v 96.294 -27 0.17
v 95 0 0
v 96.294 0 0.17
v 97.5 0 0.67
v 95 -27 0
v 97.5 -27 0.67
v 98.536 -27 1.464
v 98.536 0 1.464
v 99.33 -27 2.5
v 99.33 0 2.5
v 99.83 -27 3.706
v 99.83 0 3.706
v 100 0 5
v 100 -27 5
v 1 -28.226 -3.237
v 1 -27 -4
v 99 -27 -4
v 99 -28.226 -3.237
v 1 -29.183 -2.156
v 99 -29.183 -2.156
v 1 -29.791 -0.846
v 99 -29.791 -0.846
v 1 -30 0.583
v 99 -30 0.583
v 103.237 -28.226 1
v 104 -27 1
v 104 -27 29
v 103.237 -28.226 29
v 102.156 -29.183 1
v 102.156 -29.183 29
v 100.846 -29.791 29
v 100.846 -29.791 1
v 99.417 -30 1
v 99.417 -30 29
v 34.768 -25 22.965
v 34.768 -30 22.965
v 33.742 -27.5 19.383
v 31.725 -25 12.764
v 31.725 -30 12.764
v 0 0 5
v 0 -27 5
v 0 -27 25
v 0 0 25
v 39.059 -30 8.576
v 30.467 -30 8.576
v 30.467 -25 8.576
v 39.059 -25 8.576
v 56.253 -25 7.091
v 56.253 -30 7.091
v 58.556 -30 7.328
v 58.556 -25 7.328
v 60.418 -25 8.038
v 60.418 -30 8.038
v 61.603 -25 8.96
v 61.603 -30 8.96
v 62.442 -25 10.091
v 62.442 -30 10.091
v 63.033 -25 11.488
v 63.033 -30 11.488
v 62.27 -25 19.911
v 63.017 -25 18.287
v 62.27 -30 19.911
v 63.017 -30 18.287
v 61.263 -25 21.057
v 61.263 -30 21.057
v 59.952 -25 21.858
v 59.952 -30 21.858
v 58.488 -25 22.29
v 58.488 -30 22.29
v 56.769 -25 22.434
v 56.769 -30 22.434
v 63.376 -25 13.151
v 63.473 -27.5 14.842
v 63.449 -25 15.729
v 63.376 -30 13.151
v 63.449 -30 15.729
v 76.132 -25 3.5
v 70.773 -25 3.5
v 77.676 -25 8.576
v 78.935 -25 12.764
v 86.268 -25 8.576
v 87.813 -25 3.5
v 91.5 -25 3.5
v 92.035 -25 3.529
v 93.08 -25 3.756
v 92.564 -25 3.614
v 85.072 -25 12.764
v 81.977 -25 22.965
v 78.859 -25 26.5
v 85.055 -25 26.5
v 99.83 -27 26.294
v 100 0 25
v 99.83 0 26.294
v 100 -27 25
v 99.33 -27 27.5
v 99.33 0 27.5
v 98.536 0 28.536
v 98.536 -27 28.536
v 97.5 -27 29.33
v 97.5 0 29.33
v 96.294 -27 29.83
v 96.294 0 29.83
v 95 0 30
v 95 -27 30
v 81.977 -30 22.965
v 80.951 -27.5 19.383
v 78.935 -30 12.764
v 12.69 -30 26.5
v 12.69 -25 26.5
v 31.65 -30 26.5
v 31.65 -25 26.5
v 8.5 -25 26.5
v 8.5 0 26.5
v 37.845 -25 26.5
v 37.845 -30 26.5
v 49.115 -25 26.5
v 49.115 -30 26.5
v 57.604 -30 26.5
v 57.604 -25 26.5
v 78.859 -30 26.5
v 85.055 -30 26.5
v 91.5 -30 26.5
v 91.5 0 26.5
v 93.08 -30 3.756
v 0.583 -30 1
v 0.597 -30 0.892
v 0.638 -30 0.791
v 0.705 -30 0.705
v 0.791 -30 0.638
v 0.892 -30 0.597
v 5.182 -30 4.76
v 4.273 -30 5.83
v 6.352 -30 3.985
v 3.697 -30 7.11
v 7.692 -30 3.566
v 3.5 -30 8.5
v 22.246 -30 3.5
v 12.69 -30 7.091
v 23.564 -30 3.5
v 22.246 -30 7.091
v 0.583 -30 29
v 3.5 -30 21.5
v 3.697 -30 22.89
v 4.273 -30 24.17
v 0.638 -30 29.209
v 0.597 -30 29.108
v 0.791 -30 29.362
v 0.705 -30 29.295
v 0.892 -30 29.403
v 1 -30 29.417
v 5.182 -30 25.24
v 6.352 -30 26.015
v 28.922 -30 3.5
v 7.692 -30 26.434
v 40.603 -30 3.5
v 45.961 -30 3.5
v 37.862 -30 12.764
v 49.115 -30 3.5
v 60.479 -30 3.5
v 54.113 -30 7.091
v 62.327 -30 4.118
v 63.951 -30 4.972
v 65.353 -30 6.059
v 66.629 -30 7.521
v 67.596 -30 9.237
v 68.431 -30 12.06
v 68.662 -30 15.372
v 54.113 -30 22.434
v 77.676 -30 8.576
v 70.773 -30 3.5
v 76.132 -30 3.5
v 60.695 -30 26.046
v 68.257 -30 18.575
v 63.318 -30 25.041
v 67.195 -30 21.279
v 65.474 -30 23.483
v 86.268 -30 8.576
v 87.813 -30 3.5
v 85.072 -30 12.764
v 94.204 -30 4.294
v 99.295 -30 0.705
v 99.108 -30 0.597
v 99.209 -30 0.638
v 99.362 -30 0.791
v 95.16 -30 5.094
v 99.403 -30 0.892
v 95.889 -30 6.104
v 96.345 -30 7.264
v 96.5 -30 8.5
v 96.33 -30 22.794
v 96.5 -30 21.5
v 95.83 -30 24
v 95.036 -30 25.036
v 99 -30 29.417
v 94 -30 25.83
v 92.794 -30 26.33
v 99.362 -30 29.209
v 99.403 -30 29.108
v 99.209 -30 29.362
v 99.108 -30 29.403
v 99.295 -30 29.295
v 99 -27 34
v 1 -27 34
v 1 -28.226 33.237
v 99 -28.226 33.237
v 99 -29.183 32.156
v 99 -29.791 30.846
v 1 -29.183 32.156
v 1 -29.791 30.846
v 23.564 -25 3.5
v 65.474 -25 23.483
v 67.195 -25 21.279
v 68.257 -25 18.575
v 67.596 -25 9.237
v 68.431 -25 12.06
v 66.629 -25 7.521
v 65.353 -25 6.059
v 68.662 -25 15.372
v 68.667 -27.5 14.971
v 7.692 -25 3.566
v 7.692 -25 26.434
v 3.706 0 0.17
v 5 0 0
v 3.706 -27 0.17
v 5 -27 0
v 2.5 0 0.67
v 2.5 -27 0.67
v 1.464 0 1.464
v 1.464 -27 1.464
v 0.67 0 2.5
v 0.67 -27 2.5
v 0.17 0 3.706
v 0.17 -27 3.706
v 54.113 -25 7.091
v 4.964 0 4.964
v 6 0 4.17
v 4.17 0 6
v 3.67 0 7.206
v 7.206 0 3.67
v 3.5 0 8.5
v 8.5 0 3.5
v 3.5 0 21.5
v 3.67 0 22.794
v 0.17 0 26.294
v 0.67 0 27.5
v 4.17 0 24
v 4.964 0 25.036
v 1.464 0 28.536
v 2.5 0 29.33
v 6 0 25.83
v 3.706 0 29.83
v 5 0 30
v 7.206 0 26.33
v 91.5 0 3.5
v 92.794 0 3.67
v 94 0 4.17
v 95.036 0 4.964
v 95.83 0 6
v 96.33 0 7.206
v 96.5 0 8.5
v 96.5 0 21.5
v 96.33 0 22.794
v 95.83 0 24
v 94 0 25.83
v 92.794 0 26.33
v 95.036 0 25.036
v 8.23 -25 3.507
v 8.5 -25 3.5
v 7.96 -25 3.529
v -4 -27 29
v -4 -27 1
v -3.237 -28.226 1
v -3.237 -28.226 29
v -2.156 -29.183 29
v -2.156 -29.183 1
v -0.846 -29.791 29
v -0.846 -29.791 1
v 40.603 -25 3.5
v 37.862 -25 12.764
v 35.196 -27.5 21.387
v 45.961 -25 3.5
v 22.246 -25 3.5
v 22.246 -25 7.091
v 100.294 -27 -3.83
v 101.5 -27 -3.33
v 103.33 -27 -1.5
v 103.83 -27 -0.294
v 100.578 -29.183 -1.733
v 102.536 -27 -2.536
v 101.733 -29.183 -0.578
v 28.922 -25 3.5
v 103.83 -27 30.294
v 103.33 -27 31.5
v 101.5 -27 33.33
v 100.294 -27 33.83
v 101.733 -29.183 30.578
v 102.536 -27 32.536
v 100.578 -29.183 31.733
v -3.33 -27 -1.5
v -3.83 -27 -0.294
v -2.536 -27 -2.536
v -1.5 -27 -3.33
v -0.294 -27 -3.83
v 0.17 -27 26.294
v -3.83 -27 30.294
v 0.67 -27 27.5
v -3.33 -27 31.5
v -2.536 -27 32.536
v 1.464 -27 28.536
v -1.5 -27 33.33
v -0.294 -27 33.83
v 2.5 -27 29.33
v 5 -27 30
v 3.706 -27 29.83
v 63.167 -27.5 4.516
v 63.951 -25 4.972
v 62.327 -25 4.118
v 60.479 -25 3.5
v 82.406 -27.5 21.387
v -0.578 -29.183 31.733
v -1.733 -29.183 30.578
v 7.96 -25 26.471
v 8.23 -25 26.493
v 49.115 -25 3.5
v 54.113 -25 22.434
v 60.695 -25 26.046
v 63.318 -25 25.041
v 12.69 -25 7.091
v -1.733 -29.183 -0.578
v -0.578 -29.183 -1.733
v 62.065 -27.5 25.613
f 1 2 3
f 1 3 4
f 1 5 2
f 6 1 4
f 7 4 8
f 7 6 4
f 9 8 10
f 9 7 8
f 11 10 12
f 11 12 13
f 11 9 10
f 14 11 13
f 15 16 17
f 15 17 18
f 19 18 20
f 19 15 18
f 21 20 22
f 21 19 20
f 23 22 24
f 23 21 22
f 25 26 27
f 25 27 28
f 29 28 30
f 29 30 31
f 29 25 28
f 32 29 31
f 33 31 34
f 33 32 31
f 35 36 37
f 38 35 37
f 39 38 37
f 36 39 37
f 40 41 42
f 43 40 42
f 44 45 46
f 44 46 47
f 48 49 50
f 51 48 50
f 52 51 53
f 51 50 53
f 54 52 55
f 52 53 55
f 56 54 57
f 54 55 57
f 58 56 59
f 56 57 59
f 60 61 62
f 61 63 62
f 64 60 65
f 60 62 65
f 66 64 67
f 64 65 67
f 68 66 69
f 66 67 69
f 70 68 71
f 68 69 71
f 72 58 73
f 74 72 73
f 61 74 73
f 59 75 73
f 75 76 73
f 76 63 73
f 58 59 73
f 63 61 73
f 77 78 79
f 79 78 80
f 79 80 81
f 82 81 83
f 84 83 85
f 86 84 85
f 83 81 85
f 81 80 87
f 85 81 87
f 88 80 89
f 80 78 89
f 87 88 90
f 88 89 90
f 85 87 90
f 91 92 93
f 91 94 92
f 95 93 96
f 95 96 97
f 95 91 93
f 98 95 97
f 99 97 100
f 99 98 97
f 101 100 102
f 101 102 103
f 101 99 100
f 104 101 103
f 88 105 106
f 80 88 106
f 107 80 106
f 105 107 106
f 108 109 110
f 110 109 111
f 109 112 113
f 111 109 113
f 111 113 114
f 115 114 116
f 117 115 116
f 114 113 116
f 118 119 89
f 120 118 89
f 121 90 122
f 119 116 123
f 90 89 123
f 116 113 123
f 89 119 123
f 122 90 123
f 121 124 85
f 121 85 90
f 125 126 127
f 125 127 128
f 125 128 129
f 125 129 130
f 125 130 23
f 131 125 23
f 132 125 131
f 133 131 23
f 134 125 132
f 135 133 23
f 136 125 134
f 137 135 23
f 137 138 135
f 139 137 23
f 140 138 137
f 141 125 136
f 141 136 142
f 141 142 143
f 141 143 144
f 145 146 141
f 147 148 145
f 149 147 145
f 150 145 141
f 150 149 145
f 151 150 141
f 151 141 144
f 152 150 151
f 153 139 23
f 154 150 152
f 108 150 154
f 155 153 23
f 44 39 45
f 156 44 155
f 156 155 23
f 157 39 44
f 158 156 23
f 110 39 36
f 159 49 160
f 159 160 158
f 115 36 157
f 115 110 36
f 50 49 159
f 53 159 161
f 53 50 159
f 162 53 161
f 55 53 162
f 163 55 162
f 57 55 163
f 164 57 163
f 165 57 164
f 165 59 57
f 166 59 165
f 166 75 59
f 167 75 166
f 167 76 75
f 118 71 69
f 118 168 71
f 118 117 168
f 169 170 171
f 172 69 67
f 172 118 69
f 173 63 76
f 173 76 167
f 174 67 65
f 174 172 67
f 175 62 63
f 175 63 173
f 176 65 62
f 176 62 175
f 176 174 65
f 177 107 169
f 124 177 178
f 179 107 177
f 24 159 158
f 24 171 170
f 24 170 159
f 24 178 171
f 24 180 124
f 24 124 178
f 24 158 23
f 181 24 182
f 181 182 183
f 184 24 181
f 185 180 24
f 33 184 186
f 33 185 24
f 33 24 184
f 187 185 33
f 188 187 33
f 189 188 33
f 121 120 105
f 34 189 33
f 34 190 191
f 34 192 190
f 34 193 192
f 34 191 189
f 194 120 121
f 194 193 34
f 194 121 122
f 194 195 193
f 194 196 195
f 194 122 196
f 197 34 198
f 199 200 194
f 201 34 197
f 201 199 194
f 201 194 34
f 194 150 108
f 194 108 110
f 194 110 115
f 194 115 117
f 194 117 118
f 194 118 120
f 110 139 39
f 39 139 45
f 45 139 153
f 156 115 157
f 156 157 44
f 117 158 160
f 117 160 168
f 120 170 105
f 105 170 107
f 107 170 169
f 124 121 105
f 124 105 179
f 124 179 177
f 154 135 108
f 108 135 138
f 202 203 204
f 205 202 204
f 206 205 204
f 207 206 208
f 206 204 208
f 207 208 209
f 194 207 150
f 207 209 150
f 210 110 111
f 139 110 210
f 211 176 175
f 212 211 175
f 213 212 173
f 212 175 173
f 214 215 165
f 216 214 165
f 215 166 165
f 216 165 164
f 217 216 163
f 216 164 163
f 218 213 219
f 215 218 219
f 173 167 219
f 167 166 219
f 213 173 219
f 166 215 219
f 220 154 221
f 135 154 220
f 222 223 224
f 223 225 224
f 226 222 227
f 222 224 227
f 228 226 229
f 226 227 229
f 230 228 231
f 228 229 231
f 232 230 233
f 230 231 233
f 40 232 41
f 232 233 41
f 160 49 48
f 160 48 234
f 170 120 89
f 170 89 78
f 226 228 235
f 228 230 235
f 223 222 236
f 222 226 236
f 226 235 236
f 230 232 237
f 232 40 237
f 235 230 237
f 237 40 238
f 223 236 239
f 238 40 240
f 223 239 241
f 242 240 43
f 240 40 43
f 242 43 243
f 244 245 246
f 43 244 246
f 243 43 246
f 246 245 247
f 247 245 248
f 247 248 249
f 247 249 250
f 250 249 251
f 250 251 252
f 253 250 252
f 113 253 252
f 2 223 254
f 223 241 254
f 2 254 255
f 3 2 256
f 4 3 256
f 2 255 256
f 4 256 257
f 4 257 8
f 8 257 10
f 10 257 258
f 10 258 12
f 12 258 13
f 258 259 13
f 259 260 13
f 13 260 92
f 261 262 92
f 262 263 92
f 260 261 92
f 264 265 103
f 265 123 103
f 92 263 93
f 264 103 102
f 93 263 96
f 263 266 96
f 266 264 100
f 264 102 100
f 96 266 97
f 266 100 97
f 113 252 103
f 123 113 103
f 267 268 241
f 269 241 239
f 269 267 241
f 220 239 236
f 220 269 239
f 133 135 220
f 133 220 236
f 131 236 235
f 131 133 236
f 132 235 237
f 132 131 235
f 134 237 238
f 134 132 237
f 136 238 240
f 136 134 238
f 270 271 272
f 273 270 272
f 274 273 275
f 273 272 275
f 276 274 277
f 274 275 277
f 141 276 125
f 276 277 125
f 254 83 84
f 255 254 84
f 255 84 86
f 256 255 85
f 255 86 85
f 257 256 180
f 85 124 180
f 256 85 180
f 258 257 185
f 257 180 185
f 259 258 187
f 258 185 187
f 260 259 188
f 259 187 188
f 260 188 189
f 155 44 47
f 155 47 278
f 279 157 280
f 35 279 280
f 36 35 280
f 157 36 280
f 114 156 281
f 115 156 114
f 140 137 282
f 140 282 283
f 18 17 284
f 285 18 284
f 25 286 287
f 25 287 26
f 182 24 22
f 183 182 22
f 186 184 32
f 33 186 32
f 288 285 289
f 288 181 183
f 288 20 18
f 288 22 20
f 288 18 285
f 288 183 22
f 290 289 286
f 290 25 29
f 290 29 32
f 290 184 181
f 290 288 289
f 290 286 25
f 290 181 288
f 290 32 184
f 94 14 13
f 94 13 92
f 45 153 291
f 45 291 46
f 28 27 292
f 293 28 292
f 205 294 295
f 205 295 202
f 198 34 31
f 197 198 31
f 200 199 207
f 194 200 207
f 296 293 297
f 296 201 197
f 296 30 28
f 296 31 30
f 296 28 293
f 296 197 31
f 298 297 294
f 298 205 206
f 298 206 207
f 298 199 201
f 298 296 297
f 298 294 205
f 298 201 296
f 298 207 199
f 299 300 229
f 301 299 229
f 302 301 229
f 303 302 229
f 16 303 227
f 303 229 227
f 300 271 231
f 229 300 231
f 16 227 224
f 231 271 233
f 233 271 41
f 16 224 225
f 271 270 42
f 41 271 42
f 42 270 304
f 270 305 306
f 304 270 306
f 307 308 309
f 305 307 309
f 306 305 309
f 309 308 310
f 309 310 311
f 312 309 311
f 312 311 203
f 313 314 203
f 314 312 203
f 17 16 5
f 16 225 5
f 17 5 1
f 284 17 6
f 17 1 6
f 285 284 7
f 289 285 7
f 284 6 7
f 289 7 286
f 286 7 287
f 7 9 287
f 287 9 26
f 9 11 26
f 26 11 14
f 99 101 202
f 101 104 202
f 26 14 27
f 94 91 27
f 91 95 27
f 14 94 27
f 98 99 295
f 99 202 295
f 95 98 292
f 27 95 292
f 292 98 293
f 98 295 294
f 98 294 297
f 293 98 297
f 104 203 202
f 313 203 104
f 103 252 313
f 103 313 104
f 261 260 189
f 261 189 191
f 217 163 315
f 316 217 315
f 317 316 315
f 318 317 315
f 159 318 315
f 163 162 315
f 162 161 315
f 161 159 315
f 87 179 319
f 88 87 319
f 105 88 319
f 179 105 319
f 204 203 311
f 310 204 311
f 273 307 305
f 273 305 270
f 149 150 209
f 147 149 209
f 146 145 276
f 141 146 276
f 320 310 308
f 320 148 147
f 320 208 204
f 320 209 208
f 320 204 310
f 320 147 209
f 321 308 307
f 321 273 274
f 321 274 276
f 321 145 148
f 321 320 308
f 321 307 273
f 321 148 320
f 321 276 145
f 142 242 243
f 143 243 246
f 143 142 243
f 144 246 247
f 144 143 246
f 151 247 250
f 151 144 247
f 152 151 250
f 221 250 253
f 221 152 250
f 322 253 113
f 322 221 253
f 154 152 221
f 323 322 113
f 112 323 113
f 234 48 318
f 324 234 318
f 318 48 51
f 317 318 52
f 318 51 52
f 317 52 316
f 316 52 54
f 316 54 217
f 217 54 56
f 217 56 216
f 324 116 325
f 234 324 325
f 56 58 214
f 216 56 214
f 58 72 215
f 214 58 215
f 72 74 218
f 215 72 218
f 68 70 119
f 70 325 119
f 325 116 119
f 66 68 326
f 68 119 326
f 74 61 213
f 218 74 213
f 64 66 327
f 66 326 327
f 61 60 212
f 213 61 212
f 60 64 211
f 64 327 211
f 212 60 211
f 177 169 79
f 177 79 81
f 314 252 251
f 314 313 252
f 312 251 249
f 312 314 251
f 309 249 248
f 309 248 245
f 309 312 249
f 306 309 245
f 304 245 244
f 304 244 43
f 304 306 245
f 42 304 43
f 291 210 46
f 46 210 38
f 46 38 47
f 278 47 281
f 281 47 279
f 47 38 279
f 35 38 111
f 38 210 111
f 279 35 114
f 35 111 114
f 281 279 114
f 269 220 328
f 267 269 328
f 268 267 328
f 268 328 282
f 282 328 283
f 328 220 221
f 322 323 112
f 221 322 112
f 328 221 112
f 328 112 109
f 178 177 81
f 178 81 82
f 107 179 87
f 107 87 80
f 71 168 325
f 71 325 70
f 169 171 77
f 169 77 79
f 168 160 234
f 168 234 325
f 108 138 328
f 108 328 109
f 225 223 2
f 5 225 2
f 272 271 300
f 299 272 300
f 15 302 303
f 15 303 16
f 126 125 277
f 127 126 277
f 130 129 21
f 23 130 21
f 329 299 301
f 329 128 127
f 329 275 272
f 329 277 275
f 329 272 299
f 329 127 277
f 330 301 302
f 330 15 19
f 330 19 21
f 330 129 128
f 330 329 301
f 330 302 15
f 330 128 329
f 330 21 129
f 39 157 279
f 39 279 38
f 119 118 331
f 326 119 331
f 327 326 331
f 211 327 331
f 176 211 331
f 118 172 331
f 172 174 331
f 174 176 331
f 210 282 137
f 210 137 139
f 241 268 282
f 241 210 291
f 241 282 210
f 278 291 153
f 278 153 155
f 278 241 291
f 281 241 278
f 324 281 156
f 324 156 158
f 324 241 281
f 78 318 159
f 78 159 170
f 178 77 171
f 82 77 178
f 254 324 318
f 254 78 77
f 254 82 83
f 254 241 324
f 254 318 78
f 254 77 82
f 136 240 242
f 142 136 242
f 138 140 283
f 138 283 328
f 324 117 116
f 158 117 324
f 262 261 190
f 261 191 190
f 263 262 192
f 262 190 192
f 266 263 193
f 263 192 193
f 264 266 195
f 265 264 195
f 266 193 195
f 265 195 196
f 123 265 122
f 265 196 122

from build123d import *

# Parameters (mm, degrees)
F0_W         = 100
F0_H         = 30
F0_W_2       = 93
F0_H_2       = 23
F1_DEPTH     = 30
F2_W         = 100
F2_H         = 30
F3_DEPTH     = 3
F4_T1_DEPTH  = 28
F4_T3_DEPTH  = 98
F4_T6_ANGLE  = 90
F4_T8_ANGLE  = 90
F4_T10_ANGLE = 90
F4_T12_ANGLE = 90
F5_R         = 5
F7_DEPTH     = 25
F8_T         = -4
F11_DEPTH    = 5


# Not quite as in the source:
# - a fillet or chamfer that OpenCascade refuses, or shapes differently, is made with other operations: its cross-section is extruded or revolved along the edge and cut away or added
# - the program builds the solid bodies; features that only make, move or delete a surface that nothing else refers to are left out


with BuildPart() as f1:
    # F0 (on Front) → F1 (new body)
    with BuildSketch(Plane.XZ):
        with Locations((50, 15)):
            Rectangle(F0_W, F0_H)
        with Locations((50, 15)):
            Rectangle(F0_W_2, F0_H_2, mode=Mode.SUBTRACT)
    extrude(amount=F1_DEPTH)

    # F2 (on face) → F3 (join)
    with BuildSketch(Plane.XZ.offset(30)):
        with BuildLine():
            Line((99, 34), (1, 34))
            ThreePointArc((1, 34), (-2.5355339059, 32.5355339059), (-4, 29))
            Line((-4, 29), (-4, 1))
            ThreePointArc((-4, 1), (-2.5355339059, -2.5355339059), (1, -4))
            Line((1, -4), (99, -4))
            ThreePointArc((99, -4), (102.5355339059, -2.5355339059), (104, 1))
            Line((104, 1), (104, 29))
            ThreePointArc((104, 29), (102.5355339059, 32.5355339059), (99, 34))
        make_face()
        with Locations((50, 15)):
            Rectangle(F2_W, F2_H, mode=Mode.SUBTRACT)
    extrude(amount=-F3_DEPTH)

    # F4: fillet of radius 5 on 1 edges, made by hand

    # F4_s2 → F4_t1 (cut)
    with BuildSketch(Plane.XY.offset(1)):
        with BuildLine():
            ThreePointArc((104, -27), (102.1560370926, -29.1833001327), (99.417424305, -30))
            Line((99.417424305, -30), (104, -30))
            Line((104, -30), (104, -27))
        make_face()
        with BuildLine():
            ThreePointArc((-4, -27), (-2.1560370926, -29.1833001327), (0.582575695, -30))
            Line((0.582575695, -30), (-4, -30))
            Line((-4, -30), (-4, -27))
        make_face()
    extrude(amount=F4_T1_DEPTH, mode=Mode.SUBTRACT)

    # F4_s4 → F4_t3 (cut)
    with BuildSketch(Plane.YZ.offset(1)):
        with BuildLine():
            ThreePointArc((-27, 34), (-29.1833001327, 32.1560370926), (-30, 29.417424305))
            Line((-30, 29.417424305), (-30, 34))
            Line((-30, 34), (-27, 34))
        make_face()
        with BuildLine():
            ThreePointArc((-27, -4), (-29.1833001327, -2.1560370926), (-30, 0.582575695))
            Line((-30, 0.582575695), (-30, -4))
            Line((-30, -4), (-27, -4))
        make_face()
    extrude(amount=F4_T3_DEPTH, mode=Mode.SUBTRACT)

    # F4_s5 → F4_t6 (revolve, cut)
    with BuildSketch(Plane.XY.offset(29)):
        with BuildLine():
            ThreePointArc((104, -27), (102.1560370926, -29.1833001327), (99.417424305, -30))
            Line((99.417424305, -30), (104, -30))
            Line((104, -30), (104, -27))
        make_face()
    revolve(axis=Axis((99, -30, 29), (0, -1, 0)), revolution_arc=F4_T6_ANGLE, mode=Mode.SUBTRACT)

    # F4_s7 → F4_t8 (revolve, cut)
    with BuildSketch(Plane.YZ.offset(1)):
        with BuildLine():
            ThreePointArc((-27, 34), (-29.1833001327, 32.1560370926), (-30, 29.417424305))
            Line((-30, 29.417424305), (-30, 34))
            Line((-30, 34), (-27, 34))
        make_face()
    revolve(axis=Axis((1, -30, 29), (0, -1, 0)), revolution_arc=F4_T8_ANGLE, mode=Mode.SUBTRACT)

    # F4_s9 → F4_t10 (revolve, cut)
    with BuildSketch(Plane.XY.offset(1)):
        with BuildLine():
            ThreePointArc((-4, -27), (-2.1560370926, -29.1833001327), (0.582575695, -30))
            Line((0.582575695, -30), (-4, -30))
            Line((-4, -30), (-4, -27))
        make_face()
    revolve(axis=Axis((1, -30, 1), (0, -1, 0)), revolution_arc=F4_T10_ANGLE, mode=Mode.SUBTRACT)

    # F4_s11 → F4_t12 (revolve, cut)
    with BuildSketch(Plane.YZ.offset(99)):
        with BuildLine():
            ThreePointArc((-27, -4), (-29.1833001327, -2.1560370926), (-30, 0.582575695))
            Line((-30, 0.582575695), (-30, -4))
            Line((-30, -4), (-27, -4))
        make_face()
    revolve(axis=Axis((99, -30, 1), (0, -1, 0)), revolution_arc=F4_T12_ANGLE, mode=Mode.SUBTRACT)

    # F5
    f5_edges = [f1.edges().sort_by_distance(p)[0] for p in [
        (96.5, -15, 26.5),
        (96.5, -15, 3.5),
        (3.5, -15, 26.5),
        (3.5, -15, 3.5),
        (100, -13.5, 30),
        (0, -13.5, 30),
        (0, -13.5, 0),
        (100, -13.5, 0),
    ]]
    fillet(f5_edges, radius=F5_R)

    # F10 (on face) → F11 (join)
    with BuildSketch(Plane.XZ.offset(30)):
        with BuildLine():
            Line((7.6923411562, 26.5285422666), (7.6923411562, 26.4343375636))
            ThreePointArc((7.6923411562, 26.4343375636), (8.0948381917, 26.4835573549), (8.5, 26.5))
            Line((8.5, 26.5), (12.6897240143, 26.5))
            Line((12.6897240143, 26.5), (12.6897240143, 26.5285422666))
            Line((12.6897240143, 26.5285422666), (7.6923411562, 26.5285422666))
        make_face()
        Polygon((45.961234712, 3.5), (40.6030832841, 3.5), (40.7658357581, 2.9650311428), (46.1500129552, 2.9650311428), align=None)
        Polygon((31.649735074, 26.5), (23.5636409154, 3.5), (28.9224919537, 3.5), (30.4667918286, 8.5761276853), (39.0587834093, 8.5761276853), (40.6030832841, 3.5), (45.961234712, 3.5), (37.8450620877, 26.5), align=None)
        with BuildLine():
            add(Edge.make_bspline(
                [(37.8622995877, 12.7638210608), (35.4951182339, 20.3862481654), (35.1959972785, 21.3867561886)],
                knots=[0, 0, 0, 1, 1, 1], degree=2))
            Line((37.8622995877, 12.7638210608), (31.7251627444, 12.7638210608))
            add(Edge.make_bspline(
                [(34.7679448768, 22.9648770911), (34.2367473181, 20.9019739505), (31.7251627444, 12.7638210608)],
                knots=[0, 0, 0, 1, 1, 1], degree=2))
            add(Edge.make_bspline(
                [(35.1959972785, 21.3867561886), (34.8968763231, 22.3872642118), (34.7679448768, 22.9648770911)],
                knots=[0, 0, 0, 1, 1, 1], degree=2))
        make_face(mode=Mode.SUBTRACT)
        with BuildLine():
            Line((57.6041635325, 26.5), (49.1154362198, 26.5))
            Line((49.1154362198, 26.5), (49.1154362198, 3.5))
            Line((49.1154362198, 3.5), (60.4790861077, 3.5))
            add(Edge.make_bspline(
                [(65.3530625654, 6.0593858538), (63.4172768077, 4.2516481812), (60.4790861077, 3.5)],
                knots=[0, 0, 0, 0.5842050577, 0.5842050577, 0.5842050577], degree=2))
            add(Edge.make_bspline(
                [(68.666600735, 14.9711274212), (68.666600735, 9.1537405647), (65.3530625654, 6.0593858538)],
                knots=[0, 0, 0, 1, 1, 1], degree=2))
            add(Edge.make_bspline(
                [(65.4742581249, 23.4831815052), (68.666600735, 20.4378207439), (68.666600735, 14.9711274212)],
                knots=[0, 0, 0, 1, 1, 1], degree=2))
            add(Edge.make_bspline(
                [(57.6041635325, 26.5), (62.5909695012, 26.2337177448), (65.4742581249, 23.4831815052)],
                knots=[0.0968110332, 0.0968110332, 0.0968110332, 1, 1, 1], degree=2))
        make_face()
        with BuildLine():
            add(Edge.make_bspline(
                [(63.4732420785, 14.842195975), (63.4732420785, 22.4336795324), (56.7688068715, 22.4336795324)],
                knots=[0, 0, 0, 1, 1, 1], degree=2))
            add(Edge.make_bspline(
                [(56.2530810863, 7.0908374241), (63.4732420785, 7.0908374241), (63.4732420785, 14.842195975)],
                knots=[0, 0, 0, 1, 1, 1], degree=2))
            Line((56.2530810863, 7.0908374241), (54.1128190779, 7.0908374241))
            Line((54.1128190779, 7.0908374241), (54.1128190779, 22.4336795324))
            Line((54.1128190779, 22.4336795324), (56.7688068715, 22.4336795324))
        make_face(mode=Mode.SUBTRACT)
        with BuildLine():
            Line((93.3595513282, 2.9650311428), (93.0803262059, 3.7563127124))
            ThreePointArc((93.0803262059, 3.7563127124), (92.3004884639, 3.5644941273), (91.5, 3.5))
            Line((91.5, 3.5), (87.8126216572, 3.5))
            Line((87.8126216572, 3.5), (87.9753741312, 2.9650311428))
            Line((87.9753741312, 2.9650311428), (93.3595513282, 2.9650311428))
        make_face()
        with BuildLine():
            Line((85.0546004608, 26.5), (78.8592734471, 26.5))
            Line((78.8592734471, 26.5), (70.7731792884, 3.5))
            Line((70.7731792884, 3.5), (76.1320303268, 3.5))
            Line((76.1320303268, 3.5), (77.6763302017, 8.5761276853))
            Line((77.6763302017, 8.5761276853), (86.2683217823, 8.5761276853))
            Line((86.2683217823, 8.5761276853), (87.8126216572, 3.5))
            Line((87.8126216572, 3.5), (91.5, 3.5))
            ThreePointArc((91.5, 3.5), (92.3004884639, 3.5644941273), (93.0803262059, 3.7563127124))
            Line((93.0803262059, 3.7563127124), (85.0546004608, 26.5))
        make_face()
        with BuildLine():
            add(Edge.make_bspline(
                [(85.0718379608, 12.7638210608), (82.7046566069, 20.3862481654), (82.4055356515, 21.3867561886)],
                knots=[0, 0, 0, 1, 1, 1], degree=2))
            Line((85.0718379608, 12.7638210608), (78.9347011174, 12.7638210608))
            add(Edge.make_bspline(
                [(81.9774832498, 22.9648770911), (81.4462856911, 20.9019739505), (78.9347011174, 12.7638210608)],
                knots=[0, 0, 0, 1, 1, 1], degree=2))
            add(Edge.make_bspline(
                [(82.4055356515, 21.3867561886), (82.1064146961, 22.3872642118), (81.9774832498, 22.9648770911)],
                knots=[0, 0, 0, 1, 1, 1], degree=2))
        make_face(mode=Mode.SUBTRACT)
        with BuildLine():
            Line((7.6923411562, 26.4343375636), (7.6923411562, 3.5656624364))
            ThreePointArc((7.6923411562, 3.5656624364), (8.0948381917, 3.5164426451), (8.5, 3.5))
            Line((8.5, 3.5), (22.2461228132, 3.5))
            Line((22.2461228132, 3.5), (22.2461228132, 7.0908374241))
            Line((22.2461228132, 7.0908374241), (12.6897240143, 7.0908374241))
            Line((12.6897240143, 7.0908374241), (12.6897240143, 26.5))
            Line((12.6897240143, 26.5), (8.5, 26.5))
            ThreePointArc((8.5, 26.5), (8.0948381917, 26.4835573549), (7.6923411562, 26.4343375636))
        make_face()
    extrude(amount=-F11_DEPTH)


with BuildPart() as f7:
    # F6 (on Front) → F7 (new body)
    with BuildSketch(Plane.XZ):
        with BuildLine():
            add(Edge.make_bspline(
                [(-64.6141692996, 66.2774592638), (-57.3632405413, 65.4820326957), (-47.9649979836, 57.4179015801), (-35.44136599, 46.6694720335), (-22.7593679958, 45.2438805274), (-12.5503852984, 34.717586563), (-17.5949754851, 20.0575363254), (-41.16593926, 26.5737663135), (-51.8938502431, 42.0416927734), (-69.1953728198, 34.6634255071), (-93.0939149449, 45.9245842151), (-91.9481797024, 61.1508032719), (-73.0416739767, 67.2019561588), (-64.6141692996, 66.2774592638)],
                knots=[0, 0, 0, 0, 0.098374264, 0.187884813, 0.2668345062, 0.3470994933, 0.4198681033, 0.5217972145, 0.614123746, 0.7049715118, 0.8132456976, 0.8856629823, 1, 1, 1, 1], degree=3))
        make_face()
    extrude(amount=F7_DEPTH)

    # F8
    f8_openings = [f7.faces().sort_by_distance(p)[0] for p in [
        (-54.148596, -25, 45.943669),
    ]]
    offset(amount=F8_T, openings=f8_openings)


solid = f1.part
